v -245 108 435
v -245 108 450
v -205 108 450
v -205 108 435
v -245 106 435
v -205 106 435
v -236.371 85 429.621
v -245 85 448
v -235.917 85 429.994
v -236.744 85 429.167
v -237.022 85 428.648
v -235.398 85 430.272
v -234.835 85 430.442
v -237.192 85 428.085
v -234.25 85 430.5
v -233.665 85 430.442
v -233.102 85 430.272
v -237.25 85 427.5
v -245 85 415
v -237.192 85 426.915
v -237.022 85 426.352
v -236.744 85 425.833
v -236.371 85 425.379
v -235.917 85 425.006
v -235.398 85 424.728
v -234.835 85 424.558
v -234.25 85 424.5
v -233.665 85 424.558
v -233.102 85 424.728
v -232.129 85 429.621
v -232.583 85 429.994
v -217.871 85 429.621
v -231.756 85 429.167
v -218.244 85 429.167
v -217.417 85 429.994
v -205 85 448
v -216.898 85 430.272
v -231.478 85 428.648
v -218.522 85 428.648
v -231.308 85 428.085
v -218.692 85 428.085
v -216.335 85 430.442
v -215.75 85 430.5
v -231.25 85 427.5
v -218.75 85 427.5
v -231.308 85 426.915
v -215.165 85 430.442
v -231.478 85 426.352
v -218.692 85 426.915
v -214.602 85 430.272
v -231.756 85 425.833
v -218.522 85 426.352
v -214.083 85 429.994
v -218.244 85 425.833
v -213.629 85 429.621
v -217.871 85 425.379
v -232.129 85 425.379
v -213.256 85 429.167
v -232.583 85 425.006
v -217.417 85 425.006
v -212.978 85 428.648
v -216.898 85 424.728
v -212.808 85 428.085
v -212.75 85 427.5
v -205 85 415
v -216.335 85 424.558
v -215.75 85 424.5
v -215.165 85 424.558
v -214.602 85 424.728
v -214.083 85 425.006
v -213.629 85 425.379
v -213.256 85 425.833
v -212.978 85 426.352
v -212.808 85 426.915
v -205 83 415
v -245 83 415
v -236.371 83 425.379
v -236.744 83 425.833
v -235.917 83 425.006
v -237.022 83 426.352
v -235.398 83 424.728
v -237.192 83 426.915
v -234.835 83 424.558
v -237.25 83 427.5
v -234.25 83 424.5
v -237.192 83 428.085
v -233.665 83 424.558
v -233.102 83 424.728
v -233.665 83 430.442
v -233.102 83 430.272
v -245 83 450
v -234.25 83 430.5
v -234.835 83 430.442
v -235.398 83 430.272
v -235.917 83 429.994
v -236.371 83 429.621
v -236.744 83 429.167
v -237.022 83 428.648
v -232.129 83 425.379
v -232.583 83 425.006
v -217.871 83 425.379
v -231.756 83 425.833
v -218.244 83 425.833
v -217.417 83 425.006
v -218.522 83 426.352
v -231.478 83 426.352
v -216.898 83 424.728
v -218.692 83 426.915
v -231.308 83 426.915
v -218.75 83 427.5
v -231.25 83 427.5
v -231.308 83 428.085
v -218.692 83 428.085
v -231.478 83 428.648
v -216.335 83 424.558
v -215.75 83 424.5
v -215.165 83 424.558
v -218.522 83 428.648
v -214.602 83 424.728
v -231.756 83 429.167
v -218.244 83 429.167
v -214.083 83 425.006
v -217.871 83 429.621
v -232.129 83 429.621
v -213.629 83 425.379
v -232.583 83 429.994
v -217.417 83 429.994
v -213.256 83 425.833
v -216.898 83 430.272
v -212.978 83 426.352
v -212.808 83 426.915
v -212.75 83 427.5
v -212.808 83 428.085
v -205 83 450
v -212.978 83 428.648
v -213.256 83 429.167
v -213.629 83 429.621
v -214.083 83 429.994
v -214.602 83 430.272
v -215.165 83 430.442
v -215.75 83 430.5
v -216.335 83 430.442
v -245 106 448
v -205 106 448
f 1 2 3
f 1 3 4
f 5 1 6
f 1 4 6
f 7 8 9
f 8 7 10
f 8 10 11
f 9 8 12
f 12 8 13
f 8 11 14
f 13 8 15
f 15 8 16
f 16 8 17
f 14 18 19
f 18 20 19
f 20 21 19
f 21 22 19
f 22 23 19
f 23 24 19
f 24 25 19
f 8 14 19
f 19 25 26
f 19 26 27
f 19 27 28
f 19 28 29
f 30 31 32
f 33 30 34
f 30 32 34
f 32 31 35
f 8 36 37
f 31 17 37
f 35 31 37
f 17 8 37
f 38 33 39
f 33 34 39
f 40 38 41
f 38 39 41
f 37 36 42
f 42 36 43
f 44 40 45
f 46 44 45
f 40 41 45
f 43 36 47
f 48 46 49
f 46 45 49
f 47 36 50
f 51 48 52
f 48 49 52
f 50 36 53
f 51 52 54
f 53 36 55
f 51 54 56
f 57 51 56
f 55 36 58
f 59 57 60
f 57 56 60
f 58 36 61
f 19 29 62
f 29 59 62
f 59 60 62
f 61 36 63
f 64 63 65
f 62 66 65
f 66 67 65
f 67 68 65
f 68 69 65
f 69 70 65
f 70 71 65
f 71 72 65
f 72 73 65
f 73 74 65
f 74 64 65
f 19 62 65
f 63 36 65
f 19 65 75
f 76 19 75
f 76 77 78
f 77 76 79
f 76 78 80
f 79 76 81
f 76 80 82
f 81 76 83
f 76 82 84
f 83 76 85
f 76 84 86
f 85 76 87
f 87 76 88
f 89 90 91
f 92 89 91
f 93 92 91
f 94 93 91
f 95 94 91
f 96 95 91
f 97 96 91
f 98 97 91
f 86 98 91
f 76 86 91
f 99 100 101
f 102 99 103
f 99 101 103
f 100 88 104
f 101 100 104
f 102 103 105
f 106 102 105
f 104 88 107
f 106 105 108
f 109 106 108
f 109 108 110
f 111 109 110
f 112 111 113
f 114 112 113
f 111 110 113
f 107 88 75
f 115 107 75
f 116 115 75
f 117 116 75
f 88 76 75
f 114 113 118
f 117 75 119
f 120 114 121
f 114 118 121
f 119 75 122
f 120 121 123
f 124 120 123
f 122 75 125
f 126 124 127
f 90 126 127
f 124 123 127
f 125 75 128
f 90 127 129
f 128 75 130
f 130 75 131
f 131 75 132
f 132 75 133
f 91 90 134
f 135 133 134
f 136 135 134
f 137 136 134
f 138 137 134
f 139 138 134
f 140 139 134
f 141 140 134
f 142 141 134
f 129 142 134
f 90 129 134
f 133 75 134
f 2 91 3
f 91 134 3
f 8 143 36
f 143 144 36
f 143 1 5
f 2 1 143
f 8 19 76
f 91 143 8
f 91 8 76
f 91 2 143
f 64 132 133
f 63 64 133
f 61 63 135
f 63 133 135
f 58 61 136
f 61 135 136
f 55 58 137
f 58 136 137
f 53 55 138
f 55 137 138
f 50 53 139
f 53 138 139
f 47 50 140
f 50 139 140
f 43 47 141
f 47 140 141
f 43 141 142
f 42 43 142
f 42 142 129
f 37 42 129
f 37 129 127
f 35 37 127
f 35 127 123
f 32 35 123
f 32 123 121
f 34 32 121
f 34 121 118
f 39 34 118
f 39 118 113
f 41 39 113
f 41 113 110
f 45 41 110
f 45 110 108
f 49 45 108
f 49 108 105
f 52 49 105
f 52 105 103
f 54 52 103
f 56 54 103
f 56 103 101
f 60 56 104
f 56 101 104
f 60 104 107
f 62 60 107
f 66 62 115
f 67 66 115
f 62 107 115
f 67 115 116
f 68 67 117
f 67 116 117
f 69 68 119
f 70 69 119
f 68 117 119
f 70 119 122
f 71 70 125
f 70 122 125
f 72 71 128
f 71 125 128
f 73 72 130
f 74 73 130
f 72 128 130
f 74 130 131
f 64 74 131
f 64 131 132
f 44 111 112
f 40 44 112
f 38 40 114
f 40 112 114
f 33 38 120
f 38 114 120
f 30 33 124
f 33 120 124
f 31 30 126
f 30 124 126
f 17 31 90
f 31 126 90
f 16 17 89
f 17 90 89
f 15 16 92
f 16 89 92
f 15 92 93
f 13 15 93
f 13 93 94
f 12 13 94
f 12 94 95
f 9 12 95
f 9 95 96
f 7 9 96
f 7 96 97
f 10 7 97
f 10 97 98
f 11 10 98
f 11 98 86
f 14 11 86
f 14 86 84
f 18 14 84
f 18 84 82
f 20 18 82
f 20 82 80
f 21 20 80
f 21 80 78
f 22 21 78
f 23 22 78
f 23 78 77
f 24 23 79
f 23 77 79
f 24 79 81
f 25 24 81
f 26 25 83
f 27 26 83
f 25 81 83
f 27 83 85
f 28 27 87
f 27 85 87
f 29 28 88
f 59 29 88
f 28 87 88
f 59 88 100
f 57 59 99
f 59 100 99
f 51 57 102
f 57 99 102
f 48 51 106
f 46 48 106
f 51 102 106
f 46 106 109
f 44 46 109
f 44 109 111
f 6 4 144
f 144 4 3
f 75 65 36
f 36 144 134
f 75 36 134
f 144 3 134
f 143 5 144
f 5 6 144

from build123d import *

# Parameters (mm, degrees)
PAD004_DEPTH = 20
SKETCH013_R  = 3
HOLE_DEPTH   = 25
HOLE_TIPS_R  = 3


with BuildPart() as part:
    # Sketch014 → Pad004 (new body, symmetric)
    with BuildSketch(Plane.YZ):
        Polygon((0, -35), (0, 0), (25, 0), (25, -15), (23, -15), (23, -2), (2, -2), (2, -35), align=None)
    extrude(amount=PAD004_DEPTH, both=True)

    # Sketch013 → Hole (cut)
    with BuildSketch(Plane.XZ):
        with Locations((-9.25, -22.5)):
            Circle(SKETCH013_R)
        with Locations((9.25, -22.5)):
            Circle(SKETCH013_R)
    extrude(amount=-HOLE_DEPTH, mode=Mode.SUBTRACT)

    # Hole tips → Hole tip 1 section 0
    with BuildSketch(Plane.XZ.offset(-25), mode=Mode.PRIVATE) as hole_tip_1_s0:
        with Locations((-9.25, -22.5)):
            Circle(HOLE_TIPS_R)
    loft([hole_tip_1_s0.sketch, Vertex(-9.25, 26.802582, -22.5)], mode=Mode.SUBTRACT)

    # Hole tips → Hole tip 2 section 0
    with BuildSketch(Plane.XZ.offset(-25), mode=Mode.PRIVATE) as hole_tip_2_s0:
        with Locations((9.25, -22.5)):
            Circle(HOLE_TIPS_R)
    loft([hole_tip_2_s0.sketch, Vertex(9.25, 26.802582, -22.5)], mode=Mode.SUBTRACT)


with BuildPart() as part_1:
    # Body009 placement: moved
    add(part.part.moved(Location((0, 83, 0))))


with BuildPart() as part_2:
    # Clone008 placement: moved
    add(part_1.part.moved(Location((0, -83, 0))))


with BuildPart() as part_3:
    # Body011 placement: moved
    add(part_2.part.moved(Location((-225, 83, 450))))


solid = part_3.part
